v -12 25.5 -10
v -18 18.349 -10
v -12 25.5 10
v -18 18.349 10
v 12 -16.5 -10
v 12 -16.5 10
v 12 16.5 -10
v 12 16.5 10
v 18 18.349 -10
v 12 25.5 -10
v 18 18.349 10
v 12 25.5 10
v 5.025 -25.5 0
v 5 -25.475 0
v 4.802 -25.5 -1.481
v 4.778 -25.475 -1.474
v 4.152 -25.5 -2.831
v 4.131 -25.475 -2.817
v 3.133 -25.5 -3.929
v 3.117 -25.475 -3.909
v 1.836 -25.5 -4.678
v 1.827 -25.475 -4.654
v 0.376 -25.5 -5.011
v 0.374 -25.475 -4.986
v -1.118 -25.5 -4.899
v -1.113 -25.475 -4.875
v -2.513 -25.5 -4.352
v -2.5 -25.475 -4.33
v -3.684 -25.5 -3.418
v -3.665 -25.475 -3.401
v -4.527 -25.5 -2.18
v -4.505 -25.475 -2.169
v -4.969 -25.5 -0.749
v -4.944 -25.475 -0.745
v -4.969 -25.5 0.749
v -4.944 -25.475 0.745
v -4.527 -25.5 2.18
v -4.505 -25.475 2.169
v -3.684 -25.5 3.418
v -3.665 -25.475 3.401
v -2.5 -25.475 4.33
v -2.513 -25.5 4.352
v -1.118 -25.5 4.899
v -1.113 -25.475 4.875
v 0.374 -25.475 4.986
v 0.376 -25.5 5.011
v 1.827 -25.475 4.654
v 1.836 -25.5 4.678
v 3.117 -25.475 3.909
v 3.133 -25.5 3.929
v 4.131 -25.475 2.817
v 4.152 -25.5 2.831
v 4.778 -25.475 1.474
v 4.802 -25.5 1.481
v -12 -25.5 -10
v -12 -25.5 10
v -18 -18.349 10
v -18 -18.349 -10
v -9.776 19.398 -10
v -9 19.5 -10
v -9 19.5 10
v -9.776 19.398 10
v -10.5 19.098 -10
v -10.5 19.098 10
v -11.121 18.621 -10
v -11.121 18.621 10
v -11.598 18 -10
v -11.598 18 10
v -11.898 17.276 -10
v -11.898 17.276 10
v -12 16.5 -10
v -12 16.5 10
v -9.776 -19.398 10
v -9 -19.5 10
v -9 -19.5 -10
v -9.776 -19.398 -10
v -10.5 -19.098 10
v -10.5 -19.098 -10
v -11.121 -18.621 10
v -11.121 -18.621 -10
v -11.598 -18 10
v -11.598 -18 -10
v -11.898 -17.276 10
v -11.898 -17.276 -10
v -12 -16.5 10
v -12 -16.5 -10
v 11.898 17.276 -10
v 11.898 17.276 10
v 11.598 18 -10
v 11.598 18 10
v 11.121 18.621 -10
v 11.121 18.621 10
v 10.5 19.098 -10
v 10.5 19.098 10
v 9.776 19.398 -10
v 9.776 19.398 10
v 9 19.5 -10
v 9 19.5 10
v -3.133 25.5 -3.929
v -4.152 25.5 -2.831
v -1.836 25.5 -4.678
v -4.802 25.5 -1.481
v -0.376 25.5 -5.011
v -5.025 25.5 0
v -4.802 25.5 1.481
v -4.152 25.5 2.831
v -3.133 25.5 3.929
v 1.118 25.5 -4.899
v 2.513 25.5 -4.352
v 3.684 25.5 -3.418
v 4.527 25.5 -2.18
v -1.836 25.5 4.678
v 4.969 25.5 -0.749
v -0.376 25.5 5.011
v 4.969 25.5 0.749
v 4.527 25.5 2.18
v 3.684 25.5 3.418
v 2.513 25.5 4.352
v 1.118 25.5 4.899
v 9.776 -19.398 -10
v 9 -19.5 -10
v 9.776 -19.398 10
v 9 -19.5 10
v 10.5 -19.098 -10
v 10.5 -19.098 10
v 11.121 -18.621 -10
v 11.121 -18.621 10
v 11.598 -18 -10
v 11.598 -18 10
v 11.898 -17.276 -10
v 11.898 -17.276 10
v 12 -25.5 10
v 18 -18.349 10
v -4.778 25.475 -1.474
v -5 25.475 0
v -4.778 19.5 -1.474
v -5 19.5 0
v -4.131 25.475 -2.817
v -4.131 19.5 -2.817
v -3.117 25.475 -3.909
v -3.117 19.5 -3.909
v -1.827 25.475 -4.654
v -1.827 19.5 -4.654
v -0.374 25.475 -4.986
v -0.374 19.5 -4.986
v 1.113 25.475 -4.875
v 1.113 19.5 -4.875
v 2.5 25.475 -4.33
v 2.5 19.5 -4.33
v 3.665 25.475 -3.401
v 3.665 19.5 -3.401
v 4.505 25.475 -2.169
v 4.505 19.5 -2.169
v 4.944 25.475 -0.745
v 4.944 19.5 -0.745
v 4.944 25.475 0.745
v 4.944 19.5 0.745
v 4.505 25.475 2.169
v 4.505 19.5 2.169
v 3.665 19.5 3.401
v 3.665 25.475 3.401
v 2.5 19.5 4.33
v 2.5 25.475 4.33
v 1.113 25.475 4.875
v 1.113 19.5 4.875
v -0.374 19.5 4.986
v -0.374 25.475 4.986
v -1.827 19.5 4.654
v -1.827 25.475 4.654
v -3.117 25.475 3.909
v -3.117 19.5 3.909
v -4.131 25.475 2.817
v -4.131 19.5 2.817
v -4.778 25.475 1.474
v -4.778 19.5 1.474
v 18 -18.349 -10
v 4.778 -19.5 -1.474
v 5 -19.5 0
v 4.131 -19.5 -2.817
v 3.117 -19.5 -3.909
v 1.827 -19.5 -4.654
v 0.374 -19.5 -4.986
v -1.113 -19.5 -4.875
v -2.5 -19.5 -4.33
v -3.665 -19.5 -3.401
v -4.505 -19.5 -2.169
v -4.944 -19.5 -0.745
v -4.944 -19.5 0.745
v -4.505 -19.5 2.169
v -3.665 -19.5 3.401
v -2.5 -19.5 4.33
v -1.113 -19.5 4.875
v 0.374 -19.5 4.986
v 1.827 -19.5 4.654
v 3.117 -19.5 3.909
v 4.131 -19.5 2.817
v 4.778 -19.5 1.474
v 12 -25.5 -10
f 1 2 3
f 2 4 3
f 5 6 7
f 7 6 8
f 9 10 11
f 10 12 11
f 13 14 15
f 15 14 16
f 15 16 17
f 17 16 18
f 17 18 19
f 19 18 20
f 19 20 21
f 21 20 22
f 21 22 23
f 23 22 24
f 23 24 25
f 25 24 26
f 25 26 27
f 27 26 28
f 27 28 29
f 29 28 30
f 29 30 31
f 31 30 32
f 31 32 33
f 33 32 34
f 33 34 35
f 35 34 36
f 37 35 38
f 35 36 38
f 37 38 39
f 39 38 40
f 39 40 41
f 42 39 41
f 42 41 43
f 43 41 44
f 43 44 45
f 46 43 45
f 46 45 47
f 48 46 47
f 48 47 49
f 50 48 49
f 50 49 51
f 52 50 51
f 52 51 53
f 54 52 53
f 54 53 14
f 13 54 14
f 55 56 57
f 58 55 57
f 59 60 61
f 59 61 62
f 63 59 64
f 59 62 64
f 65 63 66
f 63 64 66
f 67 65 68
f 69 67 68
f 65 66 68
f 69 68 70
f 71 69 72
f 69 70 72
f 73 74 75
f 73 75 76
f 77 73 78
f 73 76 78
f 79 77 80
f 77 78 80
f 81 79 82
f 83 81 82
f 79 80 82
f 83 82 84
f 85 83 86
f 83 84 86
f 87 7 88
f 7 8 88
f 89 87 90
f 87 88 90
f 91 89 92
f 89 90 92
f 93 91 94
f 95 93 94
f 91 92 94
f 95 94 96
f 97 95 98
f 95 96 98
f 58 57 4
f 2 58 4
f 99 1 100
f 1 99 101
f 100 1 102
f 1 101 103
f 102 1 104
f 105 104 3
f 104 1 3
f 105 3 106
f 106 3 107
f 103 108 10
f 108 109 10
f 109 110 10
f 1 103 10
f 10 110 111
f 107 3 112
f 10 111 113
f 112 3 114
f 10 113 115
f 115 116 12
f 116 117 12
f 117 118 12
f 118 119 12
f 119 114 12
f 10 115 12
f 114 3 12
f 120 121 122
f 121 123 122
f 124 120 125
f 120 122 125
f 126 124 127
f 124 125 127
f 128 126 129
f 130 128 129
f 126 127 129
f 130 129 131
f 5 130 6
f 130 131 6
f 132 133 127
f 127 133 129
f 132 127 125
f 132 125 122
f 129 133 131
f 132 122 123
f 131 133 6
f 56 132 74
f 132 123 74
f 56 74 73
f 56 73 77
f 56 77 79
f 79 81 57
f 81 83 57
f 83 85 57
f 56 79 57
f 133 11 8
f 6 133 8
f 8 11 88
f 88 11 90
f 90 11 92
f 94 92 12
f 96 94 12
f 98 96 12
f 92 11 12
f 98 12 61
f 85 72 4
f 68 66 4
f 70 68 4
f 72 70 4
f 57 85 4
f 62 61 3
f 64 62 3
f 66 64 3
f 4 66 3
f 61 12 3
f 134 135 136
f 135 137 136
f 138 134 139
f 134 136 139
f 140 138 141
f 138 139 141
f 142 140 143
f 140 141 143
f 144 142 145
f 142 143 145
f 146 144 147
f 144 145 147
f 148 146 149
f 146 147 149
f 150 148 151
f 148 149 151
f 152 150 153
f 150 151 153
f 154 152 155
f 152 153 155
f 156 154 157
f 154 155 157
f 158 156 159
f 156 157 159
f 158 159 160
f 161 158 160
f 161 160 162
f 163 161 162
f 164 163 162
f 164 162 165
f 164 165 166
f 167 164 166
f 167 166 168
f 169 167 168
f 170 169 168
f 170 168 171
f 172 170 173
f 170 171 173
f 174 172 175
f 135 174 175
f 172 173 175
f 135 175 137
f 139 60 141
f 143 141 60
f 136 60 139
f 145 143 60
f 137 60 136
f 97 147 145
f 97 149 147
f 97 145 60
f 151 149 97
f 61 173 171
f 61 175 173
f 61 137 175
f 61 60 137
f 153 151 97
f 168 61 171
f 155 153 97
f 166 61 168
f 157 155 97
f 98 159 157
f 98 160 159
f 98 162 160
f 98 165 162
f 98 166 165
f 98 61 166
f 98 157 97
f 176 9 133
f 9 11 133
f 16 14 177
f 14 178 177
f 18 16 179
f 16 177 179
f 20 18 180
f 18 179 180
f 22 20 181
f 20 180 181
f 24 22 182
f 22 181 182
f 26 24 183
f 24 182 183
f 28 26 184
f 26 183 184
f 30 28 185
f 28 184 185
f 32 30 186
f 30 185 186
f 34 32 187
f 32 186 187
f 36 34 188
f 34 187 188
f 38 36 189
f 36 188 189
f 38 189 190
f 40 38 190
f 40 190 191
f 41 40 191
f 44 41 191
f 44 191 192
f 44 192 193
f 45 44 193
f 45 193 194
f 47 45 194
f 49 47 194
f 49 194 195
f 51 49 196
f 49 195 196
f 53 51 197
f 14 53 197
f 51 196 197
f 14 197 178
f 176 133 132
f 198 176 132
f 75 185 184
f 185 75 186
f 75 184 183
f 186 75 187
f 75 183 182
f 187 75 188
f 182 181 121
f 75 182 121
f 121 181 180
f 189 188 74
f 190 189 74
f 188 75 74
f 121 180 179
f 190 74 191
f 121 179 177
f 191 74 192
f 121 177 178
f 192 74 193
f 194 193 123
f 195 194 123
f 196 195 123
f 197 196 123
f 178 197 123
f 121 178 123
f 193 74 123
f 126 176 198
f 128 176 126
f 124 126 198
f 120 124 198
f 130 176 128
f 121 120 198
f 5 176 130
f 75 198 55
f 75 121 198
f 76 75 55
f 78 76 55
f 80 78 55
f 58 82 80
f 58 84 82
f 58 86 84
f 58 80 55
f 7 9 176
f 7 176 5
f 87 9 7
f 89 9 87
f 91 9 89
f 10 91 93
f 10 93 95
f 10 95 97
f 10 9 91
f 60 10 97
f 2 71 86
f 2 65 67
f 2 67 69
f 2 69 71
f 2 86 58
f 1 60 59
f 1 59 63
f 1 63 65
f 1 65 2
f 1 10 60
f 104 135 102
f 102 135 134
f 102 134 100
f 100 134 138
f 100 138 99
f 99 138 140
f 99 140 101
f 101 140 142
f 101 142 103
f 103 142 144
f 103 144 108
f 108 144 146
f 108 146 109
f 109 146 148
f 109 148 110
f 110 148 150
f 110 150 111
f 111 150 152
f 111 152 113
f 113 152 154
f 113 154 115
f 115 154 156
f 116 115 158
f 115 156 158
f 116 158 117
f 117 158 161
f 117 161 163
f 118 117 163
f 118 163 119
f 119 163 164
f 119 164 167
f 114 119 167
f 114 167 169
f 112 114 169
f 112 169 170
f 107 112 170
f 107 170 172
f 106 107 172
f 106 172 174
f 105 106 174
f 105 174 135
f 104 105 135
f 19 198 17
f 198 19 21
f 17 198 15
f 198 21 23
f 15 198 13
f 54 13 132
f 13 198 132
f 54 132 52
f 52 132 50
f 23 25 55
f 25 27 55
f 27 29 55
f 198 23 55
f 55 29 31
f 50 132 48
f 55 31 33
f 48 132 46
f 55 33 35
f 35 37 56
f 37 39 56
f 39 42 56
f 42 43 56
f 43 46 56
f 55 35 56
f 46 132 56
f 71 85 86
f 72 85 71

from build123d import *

# Parameters (mm, degrees)
SKETCH1_W                        = 24
SKETCH1_H                        = 39
BOSS_EXTRUDE1_DEPTH              = 10
F_10_0MM_DOWEL_HOLE1_D           = 10
F_10_0MM_DOWEL_HOLE1_DEPTH       = 24.5
F_10_0MM_DOWEL_HOLE1_CSINK_D     = 10.05
F_10_0MM_DOWEL_HOLE1_CSINK_ANGLE = 90
F_10_0MM_DOWEL_HOLE1_TIP         = 3.004303095
F_10_0MM_DOWEL_HOLE2_D           = 10
F_10_0MM_DOWEL_HOLE2_DEPTH       = 24.5
F_10_0MM_DOWEL_HOLE2_CSINK_D     = 10.05
F_10_0MM_DOWEL_HOLE2_CSINK_ANGLE = 90
F_10_0MM_DOWEL_HOLE2_TIP         = 3.004303095
FILLET1_R                        = 3


with BuildPart() as part:
    # Sketch1 → Boss-Extrude1 (new, symmetric)
    with BuildSketch(Plane.XY):
        Polygon((-18, -18.349478444), (-18, 18.349478444), (-12, 25.5), (12, 25.5), (18, 18.349478444), (18, -18.349478444), (12, -25.5), (-12, -25.5), align=None)
        Rectangle(SKETCH1_W, SKETCH1_H, mode=Mode.SUBTRACT)
    extrude(amount=BOSS_EXTRUDE1_DEPTH, both=True)

    # Ø10.0mm Dowel Hole1
    with Locations(Plane(origin=(0, 25.5, 0), x_dir=(1, 0, 0), z_dir=(0, 1, 0))):
        with Locations((0, 0)):
            CounterSinkHole(F_10_0MM_DOWEL_HOLE1_D / 2, F_10_0MM_DOWEL_HOLE1_CSINK_D / 2, depth=F_10_0MM_DOWEL_HOLE1_DEPTH, counter_sink_angle=F_10_0MM_DOWEL_HOLE1_CSINK_ANGLE)
            with Locations((0, 0, -(F_10_0MM_DOWEL_HOLE1_DEPTH + F_10_0MM_DOWEL_HOLE1_TIP / 2))):  # 118° drill point
                Cone(0, F_10_0MM_DOWEL_HOLE1_D / 2, F_10_0MM_DOWEL_HOLE1_TIP, mode=Mode.SUBTRACT)

    # Ø10.0mm Dowel Hole2
    with Locations(Plane(origin=(0, -25.5, 0), x_dir=(-1, 0, 0), z_dir=(0, -1, 0))):
        with Locations((0, 0)):
            CounterSinkHole(F_10_0MM_DOWEL_HOLE2_D / 2, F_10_0MM_DOWEL_HOLE2_CSINK_D / 2, depth=F_10_0MM_DOWEL_HOLE2_DEPTH, counter_sink_angle=F_10_0MM_DOWEL_HOLE2_CSINK_ANGLE)
            with Locations((0, 0, -(F_10_0MM_DOWEL_HOLE2_DEPTH + F_10_0MM_DOWEL_HOLE2_TIP / 2))):  # 118° drill point
                Cone(0, F_10_0MM_DOWEL_HOLE2_D / 2, F_10_0MM_DOWEL_HOLE2_TIP, mode=Mode.SUBTRACT)

    # Fillet1
    fillet1_edges = [part.edges().sort_by_distance(p)[0] for p in [
        (12, -19.5, 0),
        (12, 19.5, 0),
        (-12, 19.5, 0),
        (-12, -19.5, 0),
    ]]
    fillet(fillet1_edges, radius=FILLET1_R)


solid = part.part
